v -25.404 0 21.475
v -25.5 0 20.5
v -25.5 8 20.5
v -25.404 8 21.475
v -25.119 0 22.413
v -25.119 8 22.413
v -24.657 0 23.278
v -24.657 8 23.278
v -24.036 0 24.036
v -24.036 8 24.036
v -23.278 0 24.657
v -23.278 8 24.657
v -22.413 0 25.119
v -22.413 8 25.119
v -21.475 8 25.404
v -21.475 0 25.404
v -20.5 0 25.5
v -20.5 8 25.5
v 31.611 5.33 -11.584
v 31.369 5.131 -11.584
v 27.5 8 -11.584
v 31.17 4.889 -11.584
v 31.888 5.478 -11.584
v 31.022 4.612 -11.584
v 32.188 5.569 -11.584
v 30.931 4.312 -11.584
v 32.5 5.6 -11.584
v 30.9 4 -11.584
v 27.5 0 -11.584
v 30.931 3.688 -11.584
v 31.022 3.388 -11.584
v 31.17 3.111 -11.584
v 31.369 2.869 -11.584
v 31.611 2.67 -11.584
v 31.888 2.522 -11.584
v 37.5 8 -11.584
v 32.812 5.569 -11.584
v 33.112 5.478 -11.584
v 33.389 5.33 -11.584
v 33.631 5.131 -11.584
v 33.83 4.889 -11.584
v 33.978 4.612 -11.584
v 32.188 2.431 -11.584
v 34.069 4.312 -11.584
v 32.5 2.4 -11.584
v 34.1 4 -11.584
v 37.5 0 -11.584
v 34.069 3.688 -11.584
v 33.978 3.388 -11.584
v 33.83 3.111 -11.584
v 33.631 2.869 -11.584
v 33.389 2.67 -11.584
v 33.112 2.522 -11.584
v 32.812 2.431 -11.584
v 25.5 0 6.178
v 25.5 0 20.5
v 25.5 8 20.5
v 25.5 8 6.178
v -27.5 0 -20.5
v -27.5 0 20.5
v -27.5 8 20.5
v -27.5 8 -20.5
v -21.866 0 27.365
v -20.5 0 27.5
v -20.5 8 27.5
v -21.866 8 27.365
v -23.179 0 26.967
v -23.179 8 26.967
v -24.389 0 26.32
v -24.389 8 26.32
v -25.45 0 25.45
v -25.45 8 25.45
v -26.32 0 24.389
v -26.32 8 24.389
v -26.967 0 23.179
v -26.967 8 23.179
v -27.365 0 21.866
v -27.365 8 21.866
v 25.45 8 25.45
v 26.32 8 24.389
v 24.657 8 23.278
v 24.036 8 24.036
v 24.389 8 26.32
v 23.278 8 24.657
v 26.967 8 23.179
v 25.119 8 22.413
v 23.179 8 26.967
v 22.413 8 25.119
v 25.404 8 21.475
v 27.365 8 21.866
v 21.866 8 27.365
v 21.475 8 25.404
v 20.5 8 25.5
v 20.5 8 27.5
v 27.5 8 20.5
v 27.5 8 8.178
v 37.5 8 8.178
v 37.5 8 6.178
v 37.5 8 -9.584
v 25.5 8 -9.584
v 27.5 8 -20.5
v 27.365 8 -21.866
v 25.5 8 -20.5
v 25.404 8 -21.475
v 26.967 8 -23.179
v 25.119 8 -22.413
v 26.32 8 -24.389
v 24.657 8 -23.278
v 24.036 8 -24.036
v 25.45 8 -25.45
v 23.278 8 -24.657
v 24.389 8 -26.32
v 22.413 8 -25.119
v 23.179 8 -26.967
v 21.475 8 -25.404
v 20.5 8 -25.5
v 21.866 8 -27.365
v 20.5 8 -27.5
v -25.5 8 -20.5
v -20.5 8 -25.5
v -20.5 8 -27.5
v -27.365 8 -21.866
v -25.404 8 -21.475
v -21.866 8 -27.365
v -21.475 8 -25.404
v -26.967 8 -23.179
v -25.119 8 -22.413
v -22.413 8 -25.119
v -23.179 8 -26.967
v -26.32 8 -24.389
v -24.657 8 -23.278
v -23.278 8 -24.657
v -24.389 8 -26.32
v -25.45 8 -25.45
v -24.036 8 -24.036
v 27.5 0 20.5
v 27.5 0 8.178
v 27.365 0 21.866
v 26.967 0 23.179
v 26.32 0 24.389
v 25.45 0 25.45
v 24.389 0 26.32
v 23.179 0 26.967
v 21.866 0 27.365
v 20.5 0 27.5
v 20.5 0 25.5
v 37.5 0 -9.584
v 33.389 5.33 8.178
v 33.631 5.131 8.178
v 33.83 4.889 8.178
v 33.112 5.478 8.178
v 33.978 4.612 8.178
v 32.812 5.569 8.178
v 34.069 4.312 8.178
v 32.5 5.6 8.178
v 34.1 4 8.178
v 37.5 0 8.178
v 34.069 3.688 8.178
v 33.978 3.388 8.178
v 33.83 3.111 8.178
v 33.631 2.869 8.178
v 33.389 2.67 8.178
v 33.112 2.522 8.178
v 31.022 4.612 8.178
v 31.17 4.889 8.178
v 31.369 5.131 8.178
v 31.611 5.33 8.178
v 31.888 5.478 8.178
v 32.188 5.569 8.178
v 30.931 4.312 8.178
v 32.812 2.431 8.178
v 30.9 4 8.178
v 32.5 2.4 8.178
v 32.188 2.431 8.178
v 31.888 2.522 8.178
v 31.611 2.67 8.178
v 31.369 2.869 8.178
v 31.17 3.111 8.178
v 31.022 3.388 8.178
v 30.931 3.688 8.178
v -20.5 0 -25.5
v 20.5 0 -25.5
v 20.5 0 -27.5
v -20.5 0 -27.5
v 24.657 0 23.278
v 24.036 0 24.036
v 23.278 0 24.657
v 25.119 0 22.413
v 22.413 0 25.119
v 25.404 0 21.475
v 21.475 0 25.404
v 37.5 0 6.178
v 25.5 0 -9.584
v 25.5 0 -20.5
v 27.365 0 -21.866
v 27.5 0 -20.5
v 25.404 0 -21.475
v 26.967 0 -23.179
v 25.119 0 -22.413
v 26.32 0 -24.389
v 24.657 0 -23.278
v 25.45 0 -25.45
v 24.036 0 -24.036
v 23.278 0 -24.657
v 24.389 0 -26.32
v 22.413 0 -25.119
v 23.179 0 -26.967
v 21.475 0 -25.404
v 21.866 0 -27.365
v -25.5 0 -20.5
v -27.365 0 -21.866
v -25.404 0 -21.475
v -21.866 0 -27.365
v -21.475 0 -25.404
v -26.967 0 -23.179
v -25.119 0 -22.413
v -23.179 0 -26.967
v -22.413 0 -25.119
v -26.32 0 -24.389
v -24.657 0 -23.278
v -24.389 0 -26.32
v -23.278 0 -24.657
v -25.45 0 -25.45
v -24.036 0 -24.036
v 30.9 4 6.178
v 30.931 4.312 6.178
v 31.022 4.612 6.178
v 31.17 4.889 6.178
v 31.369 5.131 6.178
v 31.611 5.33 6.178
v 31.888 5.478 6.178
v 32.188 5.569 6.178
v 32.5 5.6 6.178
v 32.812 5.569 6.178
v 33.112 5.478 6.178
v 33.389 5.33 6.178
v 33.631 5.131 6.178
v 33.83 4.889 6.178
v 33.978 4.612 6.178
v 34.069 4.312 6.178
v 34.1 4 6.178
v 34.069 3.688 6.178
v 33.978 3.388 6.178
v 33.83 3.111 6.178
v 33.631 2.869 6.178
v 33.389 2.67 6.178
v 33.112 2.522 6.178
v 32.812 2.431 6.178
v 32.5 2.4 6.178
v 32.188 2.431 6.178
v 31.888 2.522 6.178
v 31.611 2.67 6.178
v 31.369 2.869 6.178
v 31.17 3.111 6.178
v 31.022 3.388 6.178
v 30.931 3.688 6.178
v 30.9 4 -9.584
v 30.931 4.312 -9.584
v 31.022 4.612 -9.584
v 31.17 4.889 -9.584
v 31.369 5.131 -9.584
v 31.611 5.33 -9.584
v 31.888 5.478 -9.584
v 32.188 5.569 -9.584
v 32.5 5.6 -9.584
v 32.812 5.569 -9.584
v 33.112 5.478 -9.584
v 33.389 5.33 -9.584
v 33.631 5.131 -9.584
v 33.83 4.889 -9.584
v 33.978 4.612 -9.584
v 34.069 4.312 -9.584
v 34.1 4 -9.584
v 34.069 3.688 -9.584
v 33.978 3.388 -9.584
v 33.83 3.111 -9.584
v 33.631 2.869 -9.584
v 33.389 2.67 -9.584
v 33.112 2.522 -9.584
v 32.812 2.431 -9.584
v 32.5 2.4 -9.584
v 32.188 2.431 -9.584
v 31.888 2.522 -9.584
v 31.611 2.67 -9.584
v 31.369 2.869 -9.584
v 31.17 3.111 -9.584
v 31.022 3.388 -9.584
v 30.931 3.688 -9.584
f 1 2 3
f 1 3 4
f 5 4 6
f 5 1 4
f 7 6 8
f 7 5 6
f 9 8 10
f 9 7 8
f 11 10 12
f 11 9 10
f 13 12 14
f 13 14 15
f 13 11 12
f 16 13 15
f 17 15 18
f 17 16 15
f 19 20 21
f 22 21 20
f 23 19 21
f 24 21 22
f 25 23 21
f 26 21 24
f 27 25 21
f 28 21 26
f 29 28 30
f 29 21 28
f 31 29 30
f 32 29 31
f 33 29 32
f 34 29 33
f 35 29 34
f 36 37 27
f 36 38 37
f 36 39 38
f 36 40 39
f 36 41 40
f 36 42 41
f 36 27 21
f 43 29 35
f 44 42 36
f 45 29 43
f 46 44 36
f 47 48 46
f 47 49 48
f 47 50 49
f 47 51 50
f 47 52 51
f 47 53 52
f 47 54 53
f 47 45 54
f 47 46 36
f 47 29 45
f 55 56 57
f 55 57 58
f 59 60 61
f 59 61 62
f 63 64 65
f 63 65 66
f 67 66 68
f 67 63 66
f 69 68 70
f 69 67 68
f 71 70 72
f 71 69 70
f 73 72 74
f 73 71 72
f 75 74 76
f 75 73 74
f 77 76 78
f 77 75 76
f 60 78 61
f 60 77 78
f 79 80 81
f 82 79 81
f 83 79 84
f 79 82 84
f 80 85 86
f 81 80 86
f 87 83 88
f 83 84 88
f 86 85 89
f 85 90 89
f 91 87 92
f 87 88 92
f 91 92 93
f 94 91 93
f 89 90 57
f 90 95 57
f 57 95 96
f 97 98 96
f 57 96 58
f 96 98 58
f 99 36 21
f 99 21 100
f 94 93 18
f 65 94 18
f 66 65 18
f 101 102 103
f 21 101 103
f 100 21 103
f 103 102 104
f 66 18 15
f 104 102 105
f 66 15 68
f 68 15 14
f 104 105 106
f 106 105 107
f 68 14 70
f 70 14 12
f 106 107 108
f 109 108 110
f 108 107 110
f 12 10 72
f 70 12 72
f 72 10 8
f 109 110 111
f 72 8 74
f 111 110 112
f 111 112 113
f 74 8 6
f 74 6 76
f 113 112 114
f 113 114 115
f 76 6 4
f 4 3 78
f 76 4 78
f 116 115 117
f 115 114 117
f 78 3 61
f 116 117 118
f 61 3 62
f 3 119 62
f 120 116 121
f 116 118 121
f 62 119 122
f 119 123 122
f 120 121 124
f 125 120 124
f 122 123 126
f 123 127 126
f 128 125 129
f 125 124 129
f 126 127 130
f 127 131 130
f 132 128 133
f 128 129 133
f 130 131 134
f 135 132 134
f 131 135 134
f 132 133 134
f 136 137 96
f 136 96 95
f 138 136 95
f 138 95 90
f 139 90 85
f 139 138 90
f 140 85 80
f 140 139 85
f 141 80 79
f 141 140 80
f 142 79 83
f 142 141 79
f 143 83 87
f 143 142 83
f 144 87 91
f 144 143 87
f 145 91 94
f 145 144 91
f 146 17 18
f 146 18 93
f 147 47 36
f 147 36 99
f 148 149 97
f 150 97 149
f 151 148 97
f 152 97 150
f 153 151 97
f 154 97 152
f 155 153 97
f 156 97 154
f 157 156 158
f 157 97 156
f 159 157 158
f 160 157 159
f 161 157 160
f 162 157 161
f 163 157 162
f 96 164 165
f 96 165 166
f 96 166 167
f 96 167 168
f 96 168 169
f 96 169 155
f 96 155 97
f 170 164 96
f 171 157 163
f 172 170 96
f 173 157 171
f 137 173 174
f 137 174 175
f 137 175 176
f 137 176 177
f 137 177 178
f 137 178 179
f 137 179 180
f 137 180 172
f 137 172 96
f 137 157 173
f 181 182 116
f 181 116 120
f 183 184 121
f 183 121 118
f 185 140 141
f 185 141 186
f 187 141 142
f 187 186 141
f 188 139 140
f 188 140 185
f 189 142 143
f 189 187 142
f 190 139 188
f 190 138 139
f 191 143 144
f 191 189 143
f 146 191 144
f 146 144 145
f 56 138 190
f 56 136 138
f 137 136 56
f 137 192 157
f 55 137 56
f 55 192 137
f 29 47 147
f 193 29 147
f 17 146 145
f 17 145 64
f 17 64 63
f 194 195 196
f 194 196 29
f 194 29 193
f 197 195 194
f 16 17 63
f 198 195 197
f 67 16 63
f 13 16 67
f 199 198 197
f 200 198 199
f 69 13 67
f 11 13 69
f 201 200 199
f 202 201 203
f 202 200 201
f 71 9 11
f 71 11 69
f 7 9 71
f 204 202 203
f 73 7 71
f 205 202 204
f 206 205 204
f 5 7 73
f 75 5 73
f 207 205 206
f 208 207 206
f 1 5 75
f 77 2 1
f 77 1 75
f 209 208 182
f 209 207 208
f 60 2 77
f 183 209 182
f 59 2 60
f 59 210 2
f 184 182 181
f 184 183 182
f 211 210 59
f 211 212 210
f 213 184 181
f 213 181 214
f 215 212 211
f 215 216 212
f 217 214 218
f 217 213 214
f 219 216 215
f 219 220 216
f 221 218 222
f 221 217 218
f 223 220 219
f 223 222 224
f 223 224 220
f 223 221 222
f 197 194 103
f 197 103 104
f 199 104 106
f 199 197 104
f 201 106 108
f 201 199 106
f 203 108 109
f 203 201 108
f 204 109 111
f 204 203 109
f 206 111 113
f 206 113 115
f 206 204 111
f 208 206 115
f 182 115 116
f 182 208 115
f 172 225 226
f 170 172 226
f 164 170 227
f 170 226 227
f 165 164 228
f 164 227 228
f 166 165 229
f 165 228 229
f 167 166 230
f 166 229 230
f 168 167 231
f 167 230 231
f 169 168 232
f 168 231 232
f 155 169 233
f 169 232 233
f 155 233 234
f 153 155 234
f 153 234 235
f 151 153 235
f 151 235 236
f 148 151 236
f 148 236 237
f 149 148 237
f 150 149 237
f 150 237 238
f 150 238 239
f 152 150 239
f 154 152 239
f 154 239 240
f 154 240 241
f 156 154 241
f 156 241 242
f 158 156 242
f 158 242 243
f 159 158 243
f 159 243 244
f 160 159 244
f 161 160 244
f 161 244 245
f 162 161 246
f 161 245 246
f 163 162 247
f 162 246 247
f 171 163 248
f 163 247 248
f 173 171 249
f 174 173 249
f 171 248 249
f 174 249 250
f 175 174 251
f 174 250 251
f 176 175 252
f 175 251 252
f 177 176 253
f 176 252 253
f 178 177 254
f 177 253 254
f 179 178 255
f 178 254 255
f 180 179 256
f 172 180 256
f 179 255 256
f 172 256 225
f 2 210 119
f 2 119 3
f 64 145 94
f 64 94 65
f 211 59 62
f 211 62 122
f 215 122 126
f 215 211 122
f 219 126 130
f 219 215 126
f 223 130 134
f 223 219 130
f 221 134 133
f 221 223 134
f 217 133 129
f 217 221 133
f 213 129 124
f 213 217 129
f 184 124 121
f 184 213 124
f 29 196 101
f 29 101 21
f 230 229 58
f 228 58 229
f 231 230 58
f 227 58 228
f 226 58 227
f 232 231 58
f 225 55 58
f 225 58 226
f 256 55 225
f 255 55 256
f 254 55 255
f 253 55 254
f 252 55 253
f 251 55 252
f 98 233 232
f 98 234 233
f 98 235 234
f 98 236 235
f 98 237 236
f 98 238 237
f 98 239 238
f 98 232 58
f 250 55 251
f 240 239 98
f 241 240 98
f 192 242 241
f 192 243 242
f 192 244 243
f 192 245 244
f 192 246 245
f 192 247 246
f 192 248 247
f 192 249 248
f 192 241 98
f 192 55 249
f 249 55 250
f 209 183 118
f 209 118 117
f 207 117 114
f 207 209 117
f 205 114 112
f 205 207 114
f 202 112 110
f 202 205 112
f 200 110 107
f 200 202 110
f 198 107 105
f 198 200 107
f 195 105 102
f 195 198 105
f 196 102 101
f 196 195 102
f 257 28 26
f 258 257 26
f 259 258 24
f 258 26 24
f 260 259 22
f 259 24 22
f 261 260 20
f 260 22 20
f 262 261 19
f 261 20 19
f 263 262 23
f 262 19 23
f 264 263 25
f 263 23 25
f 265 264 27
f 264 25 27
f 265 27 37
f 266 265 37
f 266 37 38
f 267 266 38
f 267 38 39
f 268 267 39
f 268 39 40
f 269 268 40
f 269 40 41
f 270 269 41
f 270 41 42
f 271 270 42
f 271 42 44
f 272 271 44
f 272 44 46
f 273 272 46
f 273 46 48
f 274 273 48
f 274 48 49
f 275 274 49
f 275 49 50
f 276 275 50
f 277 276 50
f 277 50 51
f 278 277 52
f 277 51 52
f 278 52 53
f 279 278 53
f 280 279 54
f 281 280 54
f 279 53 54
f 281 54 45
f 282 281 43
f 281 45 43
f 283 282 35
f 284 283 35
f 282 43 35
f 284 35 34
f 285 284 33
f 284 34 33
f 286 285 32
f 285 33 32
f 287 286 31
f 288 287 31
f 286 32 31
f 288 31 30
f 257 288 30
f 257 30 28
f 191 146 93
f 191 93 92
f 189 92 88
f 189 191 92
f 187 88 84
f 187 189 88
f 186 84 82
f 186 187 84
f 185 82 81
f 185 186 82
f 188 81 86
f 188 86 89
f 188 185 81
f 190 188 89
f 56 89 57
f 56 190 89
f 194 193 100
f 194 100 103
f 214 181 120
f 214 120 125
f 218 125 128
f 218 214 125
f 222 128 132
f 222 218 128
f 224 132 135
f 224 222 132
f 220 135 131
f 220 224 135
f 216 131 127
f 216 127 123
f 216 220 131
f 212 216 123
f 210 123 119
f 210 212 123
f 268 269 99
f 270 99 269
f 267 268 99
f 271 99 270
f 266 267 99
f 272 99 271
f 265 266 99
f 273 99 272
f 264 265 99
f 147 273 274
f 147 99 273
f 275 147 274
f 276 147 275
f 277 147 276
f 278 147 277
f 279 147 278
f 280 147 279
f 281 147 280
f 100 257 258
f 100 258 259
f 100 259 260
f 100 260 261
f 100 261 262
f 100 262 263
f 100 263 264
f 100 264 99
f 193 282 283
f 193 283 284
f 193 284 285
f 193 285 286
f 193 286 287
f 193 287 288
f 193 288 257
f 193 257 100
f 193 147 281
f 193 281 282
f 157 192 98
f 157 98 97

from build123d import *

# Parameters (mm, degrees)
BOSS_EXTRUDE1_DEPTH = 8
SKETCH2_R           = 1.6
CUT_EXTRUDE1_DEPTH  = 37.084183


with BuildPart() as part:
    # Sketch1 → Boss-Extrude1 (new body)
    with BuildSketch(Plane(origin=(0, 0, 0), x_dir=(1, 0, 0), z_dir=(0, 1, 0))):
        with BuildLine():
            Line((-20.5, 27.5), (20.5, 27.5))
            ThreePointArc((20.5, 27.5), (25.449747468, 25.449747468), (27.5, 20.5))
            Line((27.5, 20.5), (27.5, 11.5841835))
            Line((27.5, 11.5841835), (37.5, 11.5841835))
            Line((37.5, 11.5841835), (37.5, 9.5841835))
            Line((37.5, 9.5841835), (27.5, 9.5841835))
            Line((27.5, 9.5841835), (25.5, 9.5841835))
            Line((25.5, 9.5841835), (25.5, 20.5))
            ThreePointArc((25.5, 20.5), (24.035533906, 24.035533906), (20.5, 25.5))
            Line((20.5, 25.5), (-20.5, 25.5))
            ThreePointArc((-20.5, 25.5), (-24.035533906, 24.035533906), (-25.5, 20.5))
            Line((-25.5, 20.5), (-25.5, -20.5))
            ThreePointArc((-25.5, -20.5), (-24.035533906, -24.035533906), (-20.5, -25.5))
            Line((-20.5, -25.5), (20.5, -25.5))
            ThreePointArc((20.5, -25.5), (24.035533906, -24.035533906), (25.5, -20.5))
            Line((25.5, -20.5), (25.5, -6.177954833))
            Line((25.5, -6.177954833), (27.5, -6.177954833))
            Line((27.5, -6.177954833), (37.5, -6.177954833))
            Line((37.5, -6.177954833), (37.5, -8.177954833))
            Line((37.5, -8.177954833), (27.5, -8.177954833))
            Line((27.5, -8.177954833), (27.5, -20.5))
            ThreePointArc((27.5, -20.5), (25.449747468, -25.449747468), (20.5, -27.5))
            Line((20.5, -27.5), (-20.5, -27.5))
            ThreePointArc((-20.5, -27.5), (-25.449747468, -25.449747468), (-27.5, -20.5))
            Line((-27.5, -20.5), (-27.5, 20.5))
            ThreePointArc((-27.5, 20.5), (-25.449747468, 25.449747468), (-20.5, 27.5))
        make_face()
    extrude(amount=BOSS_EXTRUDE1_DEPTH)

    # Sketch2 → Cut-Extrude1 (cut)
    with BuildSketch(Plane(origin=(0, 0, -11.5841835), x_dir=(-1, 0, 0), z_dir=(0, 0, -1))):
        with Locations((-32.5, 4)):
            Circle(SKETCH2_R)
    extrude(amount=-CUT_EXTRUDE1_DEPTH, mode=Mode.SUBTRACT)


solid = part.part
